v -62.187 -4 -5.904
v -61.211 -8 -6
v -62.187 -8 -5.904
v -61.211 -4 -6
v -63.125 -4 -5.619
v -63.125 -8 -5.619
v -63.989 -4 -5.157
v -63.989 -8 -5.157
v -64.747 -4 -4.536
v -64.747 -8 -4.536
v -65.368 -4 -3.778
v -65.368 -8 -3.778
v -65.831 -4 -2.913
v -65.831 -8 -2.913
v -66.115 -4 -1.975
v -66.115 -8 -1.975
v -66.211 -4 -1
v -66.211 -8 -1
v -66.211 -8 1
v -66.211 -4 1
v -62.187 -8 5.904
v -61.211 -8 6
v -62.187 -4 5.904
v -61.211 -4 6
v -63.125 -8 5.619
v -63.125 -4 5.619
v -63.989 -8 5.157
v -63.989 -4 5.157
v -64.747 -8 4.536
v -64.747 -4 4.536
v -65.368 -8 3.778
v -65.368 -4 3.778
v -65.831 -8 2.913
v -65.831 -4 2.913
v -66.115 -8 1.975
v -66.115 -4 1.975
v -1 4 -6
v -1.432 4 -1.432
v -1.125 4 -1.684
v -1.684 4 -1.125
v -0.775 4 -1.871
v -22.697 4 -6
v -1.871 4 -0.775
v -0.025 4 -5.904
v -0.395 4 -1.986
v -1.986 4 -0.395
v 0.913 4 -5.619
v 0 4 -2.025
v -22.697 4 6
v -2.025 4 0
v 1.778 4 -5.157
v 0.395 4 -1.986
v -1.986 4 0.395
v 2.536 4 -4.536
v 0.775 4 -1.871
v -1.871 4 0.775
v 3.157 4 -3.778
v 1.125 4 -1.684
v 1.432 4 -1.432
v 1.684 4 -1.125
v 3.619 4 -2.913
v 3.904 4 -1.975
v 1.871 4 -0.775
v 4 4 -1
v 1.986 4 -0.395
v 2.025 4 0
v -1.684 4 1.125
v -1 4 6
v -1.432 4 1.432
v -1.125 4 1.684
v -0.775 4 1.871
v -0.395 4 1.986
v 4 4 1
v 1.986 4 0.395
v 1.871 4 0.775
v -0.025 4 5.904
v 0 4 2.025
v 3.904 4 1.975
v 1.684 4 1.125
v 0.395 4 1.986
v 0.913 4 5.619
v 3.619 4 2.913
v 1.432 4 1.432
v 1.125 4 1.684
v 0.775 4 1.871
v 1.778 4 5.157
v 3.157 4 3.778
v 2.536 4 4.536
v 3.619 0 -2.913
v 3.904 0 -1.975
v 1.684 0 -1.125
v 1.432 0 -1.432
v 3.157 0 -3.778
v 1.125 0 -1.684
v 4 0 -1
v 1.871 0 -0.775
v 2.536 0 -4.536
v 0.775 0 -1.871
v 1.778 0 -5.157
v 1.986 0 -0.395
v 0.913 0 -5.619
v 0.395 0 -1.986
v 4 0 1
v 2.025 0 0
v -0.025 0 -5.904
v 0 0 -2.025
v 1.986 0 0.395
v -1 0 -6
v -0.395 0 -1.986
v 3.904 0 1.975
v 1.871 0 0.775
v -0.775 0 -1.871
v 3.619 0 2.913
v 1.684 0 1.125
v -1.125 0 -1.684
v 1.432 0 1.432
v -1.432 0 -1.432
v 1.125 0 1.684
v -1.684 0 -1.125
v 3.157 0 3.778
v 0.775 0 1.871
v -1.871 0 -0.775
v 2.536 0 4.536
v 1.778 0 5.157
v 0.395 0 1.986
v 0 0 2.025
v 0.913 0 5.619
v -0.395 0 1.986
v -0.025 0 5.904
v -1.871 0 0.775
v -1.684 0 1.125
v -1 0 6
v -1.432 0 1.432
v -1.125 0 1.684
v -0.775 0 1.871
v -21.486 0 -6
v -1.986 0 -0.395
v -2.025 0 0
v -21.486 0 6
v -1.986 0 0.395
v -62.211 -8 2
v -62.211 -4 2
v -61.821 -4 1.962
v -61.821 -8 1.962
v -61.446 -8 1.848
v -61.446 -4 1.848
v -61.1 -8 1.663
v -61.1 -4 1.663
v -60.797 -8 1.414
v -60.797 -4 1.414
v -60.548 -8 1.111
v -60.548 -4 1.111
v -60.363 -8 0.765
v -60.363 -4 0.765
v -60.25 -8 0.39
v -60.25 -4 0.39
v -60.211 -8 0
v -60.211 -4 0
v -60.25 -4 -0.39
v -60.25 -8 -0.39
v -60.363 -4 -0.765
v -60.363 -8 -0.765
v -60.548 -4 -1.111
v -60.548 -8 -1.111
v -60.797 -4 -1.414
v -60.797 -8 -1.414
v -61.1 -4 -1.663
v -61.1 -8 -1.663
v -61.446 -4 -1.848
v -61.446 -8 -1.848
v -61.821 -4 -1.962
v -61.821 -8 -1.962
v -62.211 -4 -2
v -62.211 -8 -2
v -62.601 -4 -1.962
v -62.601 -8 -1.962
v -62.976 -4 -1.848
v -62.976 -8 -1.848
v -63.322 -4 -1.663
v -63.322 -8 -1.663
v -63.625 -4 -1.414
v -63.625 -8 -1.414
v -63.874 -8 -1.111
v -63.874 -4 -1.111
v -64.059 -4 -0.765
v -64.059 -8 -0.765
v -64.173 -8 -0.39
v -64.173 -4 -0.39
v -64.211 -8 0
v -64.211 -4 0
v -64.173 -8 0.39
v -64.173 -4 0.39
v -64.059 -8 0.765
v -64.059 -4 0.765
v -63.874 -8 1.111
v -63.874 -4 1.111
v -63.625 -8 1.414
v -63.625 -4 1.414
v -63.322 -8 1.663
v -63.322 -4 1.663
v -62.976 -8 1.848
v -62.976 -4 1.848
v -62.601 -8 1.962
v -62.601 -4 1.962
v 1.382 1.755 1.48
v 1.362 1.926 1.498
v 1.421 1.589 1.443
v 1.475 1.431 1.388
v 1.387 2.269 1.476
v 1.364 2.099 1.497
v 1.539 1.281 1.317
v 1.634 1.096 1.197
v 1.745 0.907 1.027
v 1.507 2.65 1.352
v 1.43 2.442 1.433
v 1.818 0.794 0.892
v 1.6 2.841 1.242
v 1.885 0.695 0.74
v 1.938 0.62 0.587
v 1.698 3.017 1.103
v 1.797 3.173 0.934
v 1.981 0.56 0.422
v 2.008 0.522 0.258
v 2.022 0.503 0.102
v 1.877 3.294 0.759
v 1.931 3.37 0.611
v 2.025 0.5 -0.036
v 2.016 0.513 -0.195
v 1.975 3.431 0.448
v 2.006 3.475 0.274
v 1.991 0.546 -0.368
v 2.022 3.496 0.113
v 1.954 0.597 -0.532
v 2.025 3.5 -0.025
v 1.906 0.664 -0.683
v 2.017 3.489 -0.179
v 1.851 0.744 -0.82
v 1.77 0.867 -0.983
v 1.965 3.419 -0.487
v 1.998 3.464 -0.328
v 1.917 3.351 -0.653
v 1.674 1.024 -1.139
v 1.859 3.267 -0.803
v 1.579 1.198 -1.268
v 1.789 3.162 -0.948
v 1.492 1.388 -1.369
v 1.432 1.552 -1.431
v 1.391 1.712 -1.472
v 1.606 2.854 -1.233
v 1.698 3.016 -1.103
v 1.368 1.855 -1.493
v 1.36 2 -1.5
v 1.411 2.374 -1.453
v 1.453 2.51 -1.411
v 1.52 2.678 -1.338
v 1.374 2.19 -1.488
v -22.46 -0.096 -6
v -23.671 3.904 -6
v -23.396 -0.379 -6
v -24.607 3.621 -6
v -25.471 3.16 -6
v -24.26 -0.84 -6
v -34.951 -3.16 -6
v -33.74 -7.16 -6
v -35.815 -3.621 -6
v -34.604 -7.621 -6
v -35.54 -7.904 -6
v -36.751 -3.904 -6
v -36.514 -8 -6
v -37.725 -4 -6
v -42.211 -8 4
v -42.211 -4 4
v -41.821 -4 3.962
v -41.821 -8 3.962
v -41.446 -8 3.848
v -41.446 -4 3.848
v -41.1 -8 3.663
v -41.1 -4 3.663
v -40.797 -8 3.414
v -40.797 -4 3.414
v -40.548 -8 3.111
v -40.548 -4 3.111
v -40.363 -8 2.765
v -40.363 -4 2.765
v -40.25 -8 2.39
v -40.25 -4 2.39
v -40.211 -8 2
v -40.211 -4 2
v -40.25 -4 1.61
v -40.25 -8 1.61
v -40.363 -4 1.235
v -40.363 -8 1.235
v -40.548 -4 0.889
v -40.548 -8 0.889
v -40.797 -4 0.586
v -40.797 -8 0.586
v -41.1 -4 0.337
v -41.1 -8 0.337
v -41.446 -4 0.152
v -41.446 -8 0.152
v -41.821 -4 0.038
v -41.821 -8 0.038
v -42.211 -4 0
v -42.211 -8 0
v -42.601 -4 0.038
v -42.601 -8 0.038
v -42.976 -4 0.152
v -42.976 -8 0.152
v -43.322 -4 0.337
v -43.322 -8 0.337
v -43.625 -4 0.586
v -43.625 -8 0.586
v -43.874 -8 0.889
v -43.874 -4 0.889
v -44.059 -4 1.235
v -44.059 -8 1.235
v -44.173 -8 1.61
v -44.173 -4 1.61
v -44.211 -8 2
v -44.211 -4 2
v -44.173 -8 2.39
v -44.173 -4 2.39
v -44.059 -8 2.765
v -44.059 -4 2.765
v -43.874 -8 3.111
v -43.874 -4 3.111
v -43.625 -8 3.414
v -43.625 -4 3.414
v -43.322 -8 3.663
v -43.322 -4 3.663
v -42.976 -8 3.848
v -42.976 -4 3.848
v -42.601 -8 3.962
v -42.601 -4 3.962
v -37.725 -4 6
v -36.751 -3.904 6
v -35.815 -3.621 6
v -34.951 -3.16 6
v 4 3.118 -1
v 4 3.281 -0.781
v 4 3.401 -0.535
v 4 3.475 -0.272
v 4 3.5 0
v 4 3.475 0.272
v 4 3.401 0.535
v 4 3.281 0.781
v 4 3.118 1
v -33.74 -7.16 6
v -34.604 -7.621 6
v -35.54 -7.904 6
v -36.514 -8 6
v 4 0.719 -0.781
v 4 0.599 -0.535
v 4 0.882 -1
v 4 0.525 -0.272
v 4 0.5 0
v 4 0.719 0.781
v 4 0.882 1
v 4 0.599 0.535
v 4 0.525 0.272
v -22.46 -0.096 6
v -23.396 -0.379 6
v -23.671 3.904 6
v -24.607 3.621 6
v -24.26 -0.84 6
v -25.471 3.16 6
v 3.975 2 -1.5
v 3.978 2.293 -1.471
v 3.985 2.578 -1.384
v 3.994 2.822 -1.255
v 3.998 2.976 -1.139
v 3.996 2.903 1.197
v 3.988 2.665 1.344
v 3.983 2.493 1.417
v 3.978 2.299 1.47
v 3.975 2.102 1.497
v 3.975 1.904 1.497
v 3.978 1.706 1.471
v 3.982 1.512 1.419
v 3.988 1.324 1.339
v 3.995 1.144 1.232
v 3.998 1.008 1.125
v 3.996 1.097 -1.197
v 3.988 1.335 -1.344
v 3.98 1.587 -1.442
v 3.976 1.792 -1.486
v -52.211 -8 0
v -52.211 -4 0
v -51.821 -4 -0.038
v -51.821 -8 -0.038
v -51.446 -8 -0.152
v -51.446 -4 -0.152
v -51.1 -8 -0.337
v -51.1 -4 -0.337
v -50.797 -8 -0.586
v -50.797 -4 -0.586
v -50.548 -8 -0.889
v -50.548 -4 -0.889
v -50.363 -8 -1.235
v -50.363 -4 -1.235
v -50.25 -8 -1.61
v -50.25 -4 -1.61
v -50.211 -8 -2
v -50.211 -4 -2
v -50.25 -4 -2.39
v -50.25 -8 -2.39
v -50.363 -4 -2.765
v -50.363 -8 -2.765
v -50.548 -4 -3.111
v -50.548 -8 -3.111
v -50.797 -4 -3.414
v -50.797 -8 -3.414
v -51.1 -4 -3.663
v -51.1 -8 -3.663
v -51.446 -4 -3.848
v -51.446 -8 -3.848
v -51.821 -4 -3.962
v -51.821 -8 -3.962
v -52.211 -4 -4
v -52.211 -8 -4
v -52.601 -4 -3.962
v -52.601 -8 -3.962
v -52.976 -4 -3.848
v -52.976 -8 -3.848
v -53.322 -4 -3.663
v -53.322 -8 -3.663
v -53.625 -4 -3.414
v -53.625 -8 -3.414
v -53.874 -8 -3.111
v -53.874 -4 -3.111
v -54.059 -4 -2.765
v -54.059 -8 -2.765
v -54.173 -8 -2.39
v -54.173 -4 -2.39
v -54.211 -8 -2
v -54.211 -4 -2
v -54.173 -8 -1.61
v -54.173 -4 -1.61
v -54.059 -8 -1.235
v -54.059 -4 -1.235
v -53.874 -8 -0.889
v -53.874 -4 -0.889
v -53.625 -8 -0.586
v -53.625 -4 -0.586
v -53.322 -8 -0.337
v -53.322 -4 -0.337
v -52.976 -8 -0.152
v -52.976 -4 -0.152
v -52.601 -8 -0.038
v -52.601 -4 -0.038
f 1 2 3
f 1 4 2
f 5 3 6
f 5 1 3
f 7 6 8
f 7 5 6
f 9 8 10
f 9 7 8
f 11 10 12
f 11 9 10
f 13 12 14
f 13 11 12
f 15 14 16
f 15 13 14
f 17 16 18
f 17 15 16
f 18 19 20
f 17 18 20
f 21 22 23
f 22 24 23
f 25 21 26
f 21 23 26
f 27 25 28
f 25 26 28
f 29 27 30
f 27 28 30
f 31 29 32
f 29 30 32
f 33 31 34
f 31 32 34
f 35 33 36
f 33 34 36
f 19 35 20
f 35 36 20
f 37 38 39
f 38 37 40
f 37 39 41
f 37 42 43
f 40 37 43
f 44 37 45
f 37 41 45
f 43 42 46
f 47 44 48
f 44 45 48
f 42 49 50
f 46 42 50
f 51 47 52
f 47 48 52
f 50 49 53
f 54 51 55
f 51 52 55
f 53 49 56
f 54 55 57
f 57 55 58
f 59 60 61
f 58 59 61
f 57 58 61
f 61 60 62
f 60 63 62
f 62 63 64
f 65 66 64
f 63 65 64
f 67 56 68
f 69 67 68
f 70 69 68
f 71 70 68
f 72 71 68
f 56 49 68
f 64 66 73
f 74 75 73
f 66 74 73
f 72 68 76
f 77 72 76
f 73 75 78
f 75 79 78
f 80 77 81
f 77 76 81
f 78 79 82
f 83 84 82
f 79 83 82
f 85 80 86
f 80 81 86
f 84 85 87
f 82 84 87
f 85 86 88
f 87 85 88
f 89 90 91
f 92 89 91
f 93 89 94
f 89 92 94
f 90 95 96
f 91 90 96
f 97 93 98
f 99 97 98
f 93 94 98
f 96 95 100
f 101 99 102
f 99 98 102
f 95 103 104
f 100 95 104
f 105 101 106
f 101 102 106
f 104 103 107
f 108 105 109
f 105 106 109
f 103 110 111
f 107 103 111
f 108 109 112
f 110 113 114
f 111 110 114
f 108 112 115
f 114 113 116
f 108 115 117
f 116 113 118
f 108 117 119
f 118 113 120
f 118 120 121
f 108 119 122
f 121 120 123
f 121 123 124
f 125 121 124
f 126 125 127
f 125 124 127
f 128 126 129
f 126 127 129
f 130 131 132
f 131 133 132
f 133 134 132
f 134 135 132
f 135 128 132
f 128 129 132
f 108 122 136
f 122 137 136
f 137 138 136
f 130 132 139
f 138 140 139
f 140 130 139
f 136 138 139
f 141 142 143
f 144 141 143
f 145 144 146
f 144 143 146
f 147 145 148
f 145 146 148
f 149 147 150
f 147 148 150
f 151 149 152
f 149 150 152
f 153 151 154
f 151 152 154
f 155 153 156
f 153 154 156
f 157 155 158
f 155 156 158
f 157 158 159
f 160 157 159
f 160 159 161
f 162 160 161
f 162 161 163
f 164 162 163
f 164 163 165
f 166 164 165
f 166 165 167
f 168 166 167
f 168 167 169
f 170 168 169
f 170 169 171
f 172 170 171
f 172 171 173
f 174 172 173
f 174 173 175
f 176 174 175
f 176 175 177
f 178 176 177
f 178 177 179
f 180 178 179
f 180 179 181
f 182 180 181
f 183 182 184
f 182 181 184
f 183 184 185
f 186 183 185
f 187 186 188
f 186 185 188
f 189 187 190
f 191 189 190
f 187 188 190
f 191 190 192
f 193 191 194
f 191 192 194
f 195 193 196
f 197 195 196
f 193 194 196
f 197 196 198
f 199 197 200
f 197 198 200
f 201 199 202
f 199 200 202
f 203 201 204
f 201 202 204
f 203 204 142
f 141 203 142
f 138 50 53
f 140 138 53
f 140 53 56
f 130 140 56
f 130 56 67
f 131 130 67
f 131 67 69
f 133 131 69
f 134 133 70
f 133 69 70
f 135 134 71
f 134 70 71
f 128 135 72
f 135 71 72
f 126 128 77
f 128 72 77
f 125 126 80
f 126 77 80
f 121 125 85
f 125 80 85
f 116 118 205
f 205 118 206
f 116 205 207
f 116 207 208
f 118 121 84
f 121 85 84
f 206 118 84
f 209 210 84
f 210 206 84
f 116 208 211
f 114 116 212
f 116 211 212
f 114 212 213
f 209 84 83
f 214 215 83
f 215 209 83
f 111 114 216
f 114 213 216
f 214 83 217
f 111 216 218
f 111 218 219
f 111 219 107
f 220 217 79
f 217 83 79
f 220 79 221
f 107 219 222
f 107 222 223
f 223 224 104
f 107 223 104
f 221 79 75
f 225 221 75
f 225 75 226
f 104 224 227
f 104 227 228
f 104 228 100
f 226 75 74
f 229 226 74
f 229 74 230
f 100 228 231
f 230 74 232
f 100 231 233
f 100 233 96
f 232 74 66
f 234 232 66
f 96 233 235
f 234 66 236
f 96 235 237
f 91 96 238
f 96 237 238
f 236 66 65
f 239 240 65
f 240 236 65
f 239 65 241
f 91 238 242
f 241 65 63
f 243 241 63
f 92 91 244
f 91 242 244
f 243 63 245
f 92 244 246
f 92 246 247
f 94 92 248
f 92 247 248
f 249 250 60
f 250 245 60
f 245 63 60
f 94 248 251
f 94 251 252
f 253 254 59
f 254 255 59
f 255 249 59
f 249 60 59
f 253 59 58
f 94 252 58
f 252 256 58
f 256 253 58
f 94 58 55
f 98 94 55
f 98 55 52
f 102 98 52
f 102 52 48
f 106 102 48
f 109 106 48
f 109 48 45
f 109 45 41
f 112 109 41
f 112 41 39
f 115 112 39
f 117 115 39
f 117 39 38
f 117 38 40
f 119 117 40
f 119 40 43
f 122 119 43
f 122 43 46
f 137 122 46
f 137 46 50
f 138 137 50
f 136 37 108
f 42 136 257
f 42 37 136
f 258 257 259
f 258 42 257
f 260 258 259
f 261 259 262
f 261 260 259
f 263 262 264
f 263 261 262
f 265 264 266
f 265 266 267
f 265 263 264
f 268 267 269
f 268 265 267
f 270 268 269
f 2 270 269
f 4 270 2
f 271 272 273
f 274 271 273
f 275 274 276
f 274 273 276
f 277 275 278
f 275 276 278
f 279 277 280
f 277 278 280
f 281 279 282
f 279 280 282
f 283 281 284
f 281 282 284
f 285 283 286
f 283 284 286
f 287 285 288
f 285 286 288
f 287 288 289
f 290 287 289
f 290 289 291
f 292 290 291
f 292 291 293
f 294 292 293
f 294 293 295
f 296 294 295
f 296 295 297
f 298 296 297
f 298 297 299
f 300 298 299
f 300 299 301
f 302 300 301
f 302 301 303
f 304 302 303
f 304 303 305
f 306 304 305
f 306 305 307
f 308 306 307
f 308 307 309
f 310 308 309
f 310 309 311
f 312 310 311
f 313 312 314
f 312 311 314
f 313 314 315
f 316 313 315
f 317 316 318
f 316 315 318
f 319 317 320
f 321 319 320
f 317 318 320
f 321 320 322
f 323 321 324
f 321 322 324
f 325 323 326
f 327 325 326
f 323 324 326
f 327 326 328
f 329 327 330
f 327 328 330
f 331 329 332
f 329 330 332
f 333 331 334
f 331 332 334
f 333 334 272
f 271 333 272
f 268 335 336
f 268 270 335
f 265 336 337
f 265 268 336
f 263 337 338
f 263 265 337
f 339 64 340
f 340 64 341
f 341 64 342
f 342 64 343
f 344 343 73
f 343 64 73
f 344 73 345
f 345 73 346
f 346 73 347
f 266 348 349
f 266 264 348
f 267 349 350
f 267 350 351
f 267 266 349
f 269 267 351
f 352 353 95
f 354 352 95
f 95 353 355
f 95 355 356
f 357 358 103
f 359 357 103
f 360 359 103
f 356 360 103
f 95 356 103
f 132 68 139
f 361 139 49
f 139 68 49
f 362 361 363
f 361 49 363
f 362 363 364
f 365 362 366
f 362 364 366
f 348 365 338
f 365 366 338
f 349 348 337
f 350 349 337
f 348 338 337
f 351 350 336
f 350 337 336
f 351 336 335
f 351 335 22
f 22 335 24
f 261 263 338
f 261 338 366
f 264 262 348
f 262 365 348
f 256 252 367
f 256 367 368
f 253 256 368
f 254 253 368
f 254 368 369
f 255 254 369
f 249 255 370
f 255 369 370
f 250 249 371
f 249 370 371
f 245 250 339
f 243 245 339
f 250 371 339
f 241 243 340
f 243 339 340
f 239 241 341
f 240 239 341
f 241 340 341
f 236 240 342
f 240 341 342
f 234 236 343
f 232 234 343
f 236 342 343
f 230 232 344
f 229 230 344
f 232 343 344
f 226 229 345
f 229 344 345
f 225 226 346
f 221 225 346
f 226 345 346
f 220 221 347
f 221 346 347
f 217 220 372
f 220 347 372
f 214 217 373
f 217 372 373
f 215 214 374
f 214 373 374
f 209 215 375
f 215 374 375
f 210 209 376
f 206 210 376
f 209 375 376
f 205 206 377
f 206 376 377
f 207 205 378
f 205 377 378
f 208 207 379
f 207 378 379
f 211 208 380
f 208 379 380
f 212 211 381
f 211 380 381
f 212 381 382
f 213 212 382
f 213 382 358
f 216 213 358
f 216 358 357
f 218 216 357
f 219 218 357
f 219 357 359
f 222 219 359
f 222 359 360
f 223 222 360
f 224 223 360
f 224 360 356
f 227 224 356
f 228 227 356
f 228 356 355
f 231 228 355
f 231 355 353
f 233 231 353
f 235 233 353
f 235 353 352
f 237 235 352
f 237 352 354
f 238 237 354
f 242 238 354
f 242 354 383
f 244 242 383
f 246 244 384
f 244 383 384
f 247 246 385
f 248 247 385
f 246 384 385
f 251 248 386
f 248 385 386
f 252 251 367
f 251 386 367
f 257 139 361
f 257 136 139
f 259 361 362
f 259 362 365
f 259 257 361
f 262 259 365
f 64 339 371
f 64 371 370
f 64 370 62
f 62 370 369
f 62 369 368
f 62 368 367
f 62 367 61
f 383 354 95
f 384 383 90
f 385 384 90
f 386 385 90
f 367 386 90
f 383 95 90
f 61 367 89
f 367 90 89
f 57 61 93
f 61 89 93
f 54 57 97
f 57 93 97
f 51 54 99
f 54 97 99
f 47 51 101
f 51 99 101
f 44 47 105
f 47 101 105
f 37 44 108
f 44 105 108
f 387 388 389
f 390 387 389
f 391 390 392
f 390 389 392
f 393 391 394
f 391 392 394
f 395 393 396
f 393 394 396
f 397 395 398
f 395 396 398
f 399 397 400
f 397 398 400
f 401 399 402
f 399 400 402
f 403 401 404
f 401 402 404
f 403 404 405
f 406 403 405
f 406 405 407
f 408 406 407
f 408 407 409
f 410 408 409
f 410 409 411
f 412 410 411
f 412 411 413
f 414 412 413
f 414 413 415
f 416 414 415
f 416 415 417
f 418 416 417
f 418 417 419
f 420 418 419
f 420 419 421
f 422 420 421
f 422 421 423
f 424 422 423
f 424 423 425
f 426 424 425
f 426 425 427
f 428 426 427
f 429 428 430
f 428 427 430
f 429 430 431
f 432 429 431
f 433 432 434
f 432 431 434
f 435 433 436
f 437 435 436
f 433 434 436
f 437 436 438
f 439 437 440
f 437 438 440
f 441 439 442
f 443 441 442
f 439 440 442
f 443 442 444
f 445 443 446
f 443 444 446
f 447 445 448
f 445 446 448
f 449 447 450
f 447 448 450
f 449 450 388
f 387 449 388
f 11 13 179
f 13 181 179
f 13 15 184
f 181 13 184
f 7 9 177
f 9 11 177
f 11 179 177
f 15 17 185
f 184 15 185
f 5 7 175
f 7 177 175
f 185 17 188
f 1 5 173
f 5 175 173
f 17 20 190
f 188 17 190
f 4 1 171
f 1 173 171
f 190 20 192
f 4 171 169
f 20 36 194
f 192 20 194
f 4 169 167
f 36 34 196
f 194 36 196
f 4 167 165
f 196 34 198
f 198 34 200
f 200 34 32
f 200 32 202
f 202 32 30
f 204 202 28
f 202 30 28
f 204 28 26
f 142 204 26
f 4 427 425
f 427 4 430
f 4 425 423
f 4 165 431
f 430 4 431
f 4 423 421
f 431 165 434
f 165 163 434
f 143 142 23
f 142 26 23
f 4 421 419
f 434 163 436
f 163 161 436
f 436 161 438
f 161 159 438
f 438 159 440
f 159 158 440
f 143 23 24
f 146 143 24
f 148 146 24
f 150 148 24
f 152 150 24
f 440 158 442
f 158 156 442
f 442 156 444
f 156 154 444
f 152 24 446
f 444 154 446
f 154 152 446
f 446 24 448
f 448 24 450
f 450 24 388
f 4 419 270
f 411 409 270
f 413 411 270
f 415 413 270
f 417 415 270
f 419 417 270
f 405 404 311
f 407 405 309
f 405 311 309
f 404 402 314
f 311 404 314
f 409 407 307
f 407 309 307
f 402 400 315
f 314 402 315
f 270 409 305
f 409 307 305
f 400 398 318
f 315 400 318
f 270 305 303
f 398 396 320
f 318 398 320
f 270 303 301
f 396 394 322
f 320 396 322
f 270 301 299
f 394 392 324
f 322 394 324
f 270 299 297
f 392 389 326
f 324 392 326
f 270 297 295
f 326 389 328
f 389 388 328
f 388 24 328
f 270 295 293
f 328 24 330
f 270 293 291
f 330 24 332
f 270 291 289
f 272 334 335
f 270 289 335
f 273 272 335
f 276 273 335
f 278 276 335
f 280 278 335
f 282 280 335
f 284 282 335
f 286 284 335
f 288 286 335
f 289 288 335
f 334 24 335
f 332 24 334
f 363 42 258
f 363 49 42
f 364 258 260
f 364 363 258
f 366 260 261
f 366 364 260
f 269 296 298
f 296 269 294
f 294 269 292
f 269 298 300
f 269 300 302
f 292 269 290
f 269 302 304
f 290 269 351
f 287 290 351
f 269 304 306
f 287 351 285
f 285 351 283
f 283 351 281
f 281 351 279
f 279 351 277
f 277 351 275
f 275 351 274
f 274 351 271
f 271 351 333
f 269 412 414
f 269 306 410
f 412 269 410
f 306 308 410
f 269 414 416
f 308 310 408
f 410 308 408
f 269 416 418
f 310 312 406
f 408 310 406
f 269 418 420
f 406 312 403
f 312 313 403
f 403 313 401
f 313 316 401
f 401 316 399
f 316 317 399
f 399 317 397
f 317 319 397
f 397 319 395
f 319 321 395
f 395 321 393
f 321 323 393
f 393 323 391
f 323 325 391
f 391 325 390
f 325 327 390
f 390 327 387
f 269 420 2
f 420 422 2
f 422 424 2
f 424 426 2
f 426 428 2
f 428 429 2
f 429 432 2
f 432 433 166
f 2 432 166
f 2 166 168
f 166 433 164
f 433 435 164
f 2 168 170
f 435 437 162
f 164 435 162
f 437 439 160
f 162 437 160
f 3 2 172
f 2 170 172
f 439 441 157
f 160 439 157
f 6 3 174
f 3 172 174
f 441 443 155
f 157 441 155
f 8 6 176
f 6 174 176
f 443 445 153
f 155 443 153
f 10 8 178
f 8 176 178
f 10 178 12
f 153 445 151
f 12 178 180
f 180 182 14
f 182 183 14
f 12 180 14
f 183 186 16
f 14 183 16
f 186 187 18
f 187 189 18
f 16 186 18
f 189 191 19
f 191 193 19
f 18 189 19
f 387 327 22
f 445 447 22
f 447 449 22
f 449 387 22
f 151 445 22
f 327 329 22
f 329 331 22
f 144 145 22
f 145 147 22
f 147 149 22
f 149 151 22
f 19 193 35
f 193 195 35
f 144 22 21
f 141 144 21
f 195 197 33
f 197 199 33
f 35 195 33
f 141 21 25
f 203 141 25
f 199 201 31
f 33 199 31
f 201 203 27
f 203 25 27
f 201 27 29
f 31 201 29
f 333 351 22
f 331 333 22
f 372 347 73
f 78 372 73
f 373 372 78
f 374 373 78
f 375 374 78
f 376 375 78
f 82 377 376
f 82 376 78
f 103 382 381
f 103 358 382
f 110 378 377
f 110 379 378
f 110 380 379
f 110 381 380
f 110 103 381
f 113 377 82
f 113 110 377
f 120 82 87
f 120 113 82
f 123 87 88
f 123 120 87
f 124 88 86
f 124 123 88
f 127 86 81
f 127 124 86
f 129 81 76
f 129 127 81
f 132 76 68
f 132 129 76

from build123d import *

# Parameters (mm, degrees)
BOSS_EXTRUDE1_DEPTH        = 6
SKETCH2_R                  = 2.025
CUT_EXTRUDE1_DEPTH         = 68.55671766
SKETCH3_R                  = 2
CUT_EXTRUDE2_DEPTH         = 67.962004906
FILLET1_R                  = 5
M3X0_5_TAPPED_HOLE1_REACH  = 72.92
M3X0_5_TAPPED_HOLE1_BORE_R = 1.5


with BuildPart() as part:
    # Sketch1 → Boss-Extrude1 (new, symmetric)
    with BuildSketch(Plane.XY):
        Polygon((4, 0), (-23, 0), (-35, -8), (-66.211102551, -8), (-66.211102551, -4), (-36.211102551, -4), (-24.211102551, 4), (4, 4), align=None)
    extrude(amount=BOSS_EXTRUDE1_DEPTH, both=True)

    # Sketch2 → Cut-Extrude1 (cut, through all)
    with BuildSketch(Plane(origin=(0, 4, 0), x_dir=(1, 0, 0), z_dir=(0, 1, 0))):
        with Locations(Location((0, 0, 0), (0, 0, 180))):
            Circle(SKETCH2_R)
    extrude(amount=-CUT_EXTRUDE1_DEPTH, mode=Mode.SUBTRACT)

    # Sketch3 → Cut-Extrude2 (cut, through all)
    with BuildSketch(Plane(origin=(0, -4, 0), x_dir=(1, 0, 0), z_dir=(0, 1, 0))):
        with Locations(Location((-62.211102551, 0, 0), (0, 0, 270))):
            Circle(SKETCH3_R)
        with Locations(Location((-52.211102551, 2, 0), (0, 0, 270))):
            Circle(SKETCH3_R)
        with Locations(Location((-42.211102551, -2, 0), (0, 0, 270))):
            Circle(SKETCH3_R)
    extrude(amount=-CUT_EXTRUDE2_DEPTH, mode=Mode.SUBTRACT)

    # Fillet1
    fillet1_edges = [part.edges().sort_by_distance(p)[0] for p in [
        (4, 2, -6),
        (-23, 0, 0),
        (-35, -8, 0),
        (-36.211102551, -4, 0),
        (-24.211102551, 4, 0),
        (-66.211102551, -6, 6),
        (4, 2, 6),
        (-66.211102551, -6, -6),
    ]]
    fillet(fillet1_edges, radius=FILLET1_R)

    # M3x0.5 Tapped Hole1 bore → M3x0.5 Tapped Hole1 (cut, up to next)
    with BuildSketch(Plane(origin=(4, 0, 0), x_dir=(0, 0, -1), z_dir=(1, 0, 0)), mode=Mode.PRIVATE) as m3x0_5_tapped_hole1_sk1:
        with Locations((0, 2)):
            Circle(M3X0_5_TAPPED_HOLE1_BORE_R)
    m3x0_5_tapped_hole1_tool1 = extrude(m3x0_5_tapped_hole1_sk1.sketch, amount=-M3X0_5_TAPPED_HOLE1_REACH, mode=Mode.PRIVATE) & part.part
    add(m3x0_5_tapped_hole1_tool1.solids().sort_by_distance((4, 2, 0))[0], mode=Mode.SUBTRACT)


solid = part.part
